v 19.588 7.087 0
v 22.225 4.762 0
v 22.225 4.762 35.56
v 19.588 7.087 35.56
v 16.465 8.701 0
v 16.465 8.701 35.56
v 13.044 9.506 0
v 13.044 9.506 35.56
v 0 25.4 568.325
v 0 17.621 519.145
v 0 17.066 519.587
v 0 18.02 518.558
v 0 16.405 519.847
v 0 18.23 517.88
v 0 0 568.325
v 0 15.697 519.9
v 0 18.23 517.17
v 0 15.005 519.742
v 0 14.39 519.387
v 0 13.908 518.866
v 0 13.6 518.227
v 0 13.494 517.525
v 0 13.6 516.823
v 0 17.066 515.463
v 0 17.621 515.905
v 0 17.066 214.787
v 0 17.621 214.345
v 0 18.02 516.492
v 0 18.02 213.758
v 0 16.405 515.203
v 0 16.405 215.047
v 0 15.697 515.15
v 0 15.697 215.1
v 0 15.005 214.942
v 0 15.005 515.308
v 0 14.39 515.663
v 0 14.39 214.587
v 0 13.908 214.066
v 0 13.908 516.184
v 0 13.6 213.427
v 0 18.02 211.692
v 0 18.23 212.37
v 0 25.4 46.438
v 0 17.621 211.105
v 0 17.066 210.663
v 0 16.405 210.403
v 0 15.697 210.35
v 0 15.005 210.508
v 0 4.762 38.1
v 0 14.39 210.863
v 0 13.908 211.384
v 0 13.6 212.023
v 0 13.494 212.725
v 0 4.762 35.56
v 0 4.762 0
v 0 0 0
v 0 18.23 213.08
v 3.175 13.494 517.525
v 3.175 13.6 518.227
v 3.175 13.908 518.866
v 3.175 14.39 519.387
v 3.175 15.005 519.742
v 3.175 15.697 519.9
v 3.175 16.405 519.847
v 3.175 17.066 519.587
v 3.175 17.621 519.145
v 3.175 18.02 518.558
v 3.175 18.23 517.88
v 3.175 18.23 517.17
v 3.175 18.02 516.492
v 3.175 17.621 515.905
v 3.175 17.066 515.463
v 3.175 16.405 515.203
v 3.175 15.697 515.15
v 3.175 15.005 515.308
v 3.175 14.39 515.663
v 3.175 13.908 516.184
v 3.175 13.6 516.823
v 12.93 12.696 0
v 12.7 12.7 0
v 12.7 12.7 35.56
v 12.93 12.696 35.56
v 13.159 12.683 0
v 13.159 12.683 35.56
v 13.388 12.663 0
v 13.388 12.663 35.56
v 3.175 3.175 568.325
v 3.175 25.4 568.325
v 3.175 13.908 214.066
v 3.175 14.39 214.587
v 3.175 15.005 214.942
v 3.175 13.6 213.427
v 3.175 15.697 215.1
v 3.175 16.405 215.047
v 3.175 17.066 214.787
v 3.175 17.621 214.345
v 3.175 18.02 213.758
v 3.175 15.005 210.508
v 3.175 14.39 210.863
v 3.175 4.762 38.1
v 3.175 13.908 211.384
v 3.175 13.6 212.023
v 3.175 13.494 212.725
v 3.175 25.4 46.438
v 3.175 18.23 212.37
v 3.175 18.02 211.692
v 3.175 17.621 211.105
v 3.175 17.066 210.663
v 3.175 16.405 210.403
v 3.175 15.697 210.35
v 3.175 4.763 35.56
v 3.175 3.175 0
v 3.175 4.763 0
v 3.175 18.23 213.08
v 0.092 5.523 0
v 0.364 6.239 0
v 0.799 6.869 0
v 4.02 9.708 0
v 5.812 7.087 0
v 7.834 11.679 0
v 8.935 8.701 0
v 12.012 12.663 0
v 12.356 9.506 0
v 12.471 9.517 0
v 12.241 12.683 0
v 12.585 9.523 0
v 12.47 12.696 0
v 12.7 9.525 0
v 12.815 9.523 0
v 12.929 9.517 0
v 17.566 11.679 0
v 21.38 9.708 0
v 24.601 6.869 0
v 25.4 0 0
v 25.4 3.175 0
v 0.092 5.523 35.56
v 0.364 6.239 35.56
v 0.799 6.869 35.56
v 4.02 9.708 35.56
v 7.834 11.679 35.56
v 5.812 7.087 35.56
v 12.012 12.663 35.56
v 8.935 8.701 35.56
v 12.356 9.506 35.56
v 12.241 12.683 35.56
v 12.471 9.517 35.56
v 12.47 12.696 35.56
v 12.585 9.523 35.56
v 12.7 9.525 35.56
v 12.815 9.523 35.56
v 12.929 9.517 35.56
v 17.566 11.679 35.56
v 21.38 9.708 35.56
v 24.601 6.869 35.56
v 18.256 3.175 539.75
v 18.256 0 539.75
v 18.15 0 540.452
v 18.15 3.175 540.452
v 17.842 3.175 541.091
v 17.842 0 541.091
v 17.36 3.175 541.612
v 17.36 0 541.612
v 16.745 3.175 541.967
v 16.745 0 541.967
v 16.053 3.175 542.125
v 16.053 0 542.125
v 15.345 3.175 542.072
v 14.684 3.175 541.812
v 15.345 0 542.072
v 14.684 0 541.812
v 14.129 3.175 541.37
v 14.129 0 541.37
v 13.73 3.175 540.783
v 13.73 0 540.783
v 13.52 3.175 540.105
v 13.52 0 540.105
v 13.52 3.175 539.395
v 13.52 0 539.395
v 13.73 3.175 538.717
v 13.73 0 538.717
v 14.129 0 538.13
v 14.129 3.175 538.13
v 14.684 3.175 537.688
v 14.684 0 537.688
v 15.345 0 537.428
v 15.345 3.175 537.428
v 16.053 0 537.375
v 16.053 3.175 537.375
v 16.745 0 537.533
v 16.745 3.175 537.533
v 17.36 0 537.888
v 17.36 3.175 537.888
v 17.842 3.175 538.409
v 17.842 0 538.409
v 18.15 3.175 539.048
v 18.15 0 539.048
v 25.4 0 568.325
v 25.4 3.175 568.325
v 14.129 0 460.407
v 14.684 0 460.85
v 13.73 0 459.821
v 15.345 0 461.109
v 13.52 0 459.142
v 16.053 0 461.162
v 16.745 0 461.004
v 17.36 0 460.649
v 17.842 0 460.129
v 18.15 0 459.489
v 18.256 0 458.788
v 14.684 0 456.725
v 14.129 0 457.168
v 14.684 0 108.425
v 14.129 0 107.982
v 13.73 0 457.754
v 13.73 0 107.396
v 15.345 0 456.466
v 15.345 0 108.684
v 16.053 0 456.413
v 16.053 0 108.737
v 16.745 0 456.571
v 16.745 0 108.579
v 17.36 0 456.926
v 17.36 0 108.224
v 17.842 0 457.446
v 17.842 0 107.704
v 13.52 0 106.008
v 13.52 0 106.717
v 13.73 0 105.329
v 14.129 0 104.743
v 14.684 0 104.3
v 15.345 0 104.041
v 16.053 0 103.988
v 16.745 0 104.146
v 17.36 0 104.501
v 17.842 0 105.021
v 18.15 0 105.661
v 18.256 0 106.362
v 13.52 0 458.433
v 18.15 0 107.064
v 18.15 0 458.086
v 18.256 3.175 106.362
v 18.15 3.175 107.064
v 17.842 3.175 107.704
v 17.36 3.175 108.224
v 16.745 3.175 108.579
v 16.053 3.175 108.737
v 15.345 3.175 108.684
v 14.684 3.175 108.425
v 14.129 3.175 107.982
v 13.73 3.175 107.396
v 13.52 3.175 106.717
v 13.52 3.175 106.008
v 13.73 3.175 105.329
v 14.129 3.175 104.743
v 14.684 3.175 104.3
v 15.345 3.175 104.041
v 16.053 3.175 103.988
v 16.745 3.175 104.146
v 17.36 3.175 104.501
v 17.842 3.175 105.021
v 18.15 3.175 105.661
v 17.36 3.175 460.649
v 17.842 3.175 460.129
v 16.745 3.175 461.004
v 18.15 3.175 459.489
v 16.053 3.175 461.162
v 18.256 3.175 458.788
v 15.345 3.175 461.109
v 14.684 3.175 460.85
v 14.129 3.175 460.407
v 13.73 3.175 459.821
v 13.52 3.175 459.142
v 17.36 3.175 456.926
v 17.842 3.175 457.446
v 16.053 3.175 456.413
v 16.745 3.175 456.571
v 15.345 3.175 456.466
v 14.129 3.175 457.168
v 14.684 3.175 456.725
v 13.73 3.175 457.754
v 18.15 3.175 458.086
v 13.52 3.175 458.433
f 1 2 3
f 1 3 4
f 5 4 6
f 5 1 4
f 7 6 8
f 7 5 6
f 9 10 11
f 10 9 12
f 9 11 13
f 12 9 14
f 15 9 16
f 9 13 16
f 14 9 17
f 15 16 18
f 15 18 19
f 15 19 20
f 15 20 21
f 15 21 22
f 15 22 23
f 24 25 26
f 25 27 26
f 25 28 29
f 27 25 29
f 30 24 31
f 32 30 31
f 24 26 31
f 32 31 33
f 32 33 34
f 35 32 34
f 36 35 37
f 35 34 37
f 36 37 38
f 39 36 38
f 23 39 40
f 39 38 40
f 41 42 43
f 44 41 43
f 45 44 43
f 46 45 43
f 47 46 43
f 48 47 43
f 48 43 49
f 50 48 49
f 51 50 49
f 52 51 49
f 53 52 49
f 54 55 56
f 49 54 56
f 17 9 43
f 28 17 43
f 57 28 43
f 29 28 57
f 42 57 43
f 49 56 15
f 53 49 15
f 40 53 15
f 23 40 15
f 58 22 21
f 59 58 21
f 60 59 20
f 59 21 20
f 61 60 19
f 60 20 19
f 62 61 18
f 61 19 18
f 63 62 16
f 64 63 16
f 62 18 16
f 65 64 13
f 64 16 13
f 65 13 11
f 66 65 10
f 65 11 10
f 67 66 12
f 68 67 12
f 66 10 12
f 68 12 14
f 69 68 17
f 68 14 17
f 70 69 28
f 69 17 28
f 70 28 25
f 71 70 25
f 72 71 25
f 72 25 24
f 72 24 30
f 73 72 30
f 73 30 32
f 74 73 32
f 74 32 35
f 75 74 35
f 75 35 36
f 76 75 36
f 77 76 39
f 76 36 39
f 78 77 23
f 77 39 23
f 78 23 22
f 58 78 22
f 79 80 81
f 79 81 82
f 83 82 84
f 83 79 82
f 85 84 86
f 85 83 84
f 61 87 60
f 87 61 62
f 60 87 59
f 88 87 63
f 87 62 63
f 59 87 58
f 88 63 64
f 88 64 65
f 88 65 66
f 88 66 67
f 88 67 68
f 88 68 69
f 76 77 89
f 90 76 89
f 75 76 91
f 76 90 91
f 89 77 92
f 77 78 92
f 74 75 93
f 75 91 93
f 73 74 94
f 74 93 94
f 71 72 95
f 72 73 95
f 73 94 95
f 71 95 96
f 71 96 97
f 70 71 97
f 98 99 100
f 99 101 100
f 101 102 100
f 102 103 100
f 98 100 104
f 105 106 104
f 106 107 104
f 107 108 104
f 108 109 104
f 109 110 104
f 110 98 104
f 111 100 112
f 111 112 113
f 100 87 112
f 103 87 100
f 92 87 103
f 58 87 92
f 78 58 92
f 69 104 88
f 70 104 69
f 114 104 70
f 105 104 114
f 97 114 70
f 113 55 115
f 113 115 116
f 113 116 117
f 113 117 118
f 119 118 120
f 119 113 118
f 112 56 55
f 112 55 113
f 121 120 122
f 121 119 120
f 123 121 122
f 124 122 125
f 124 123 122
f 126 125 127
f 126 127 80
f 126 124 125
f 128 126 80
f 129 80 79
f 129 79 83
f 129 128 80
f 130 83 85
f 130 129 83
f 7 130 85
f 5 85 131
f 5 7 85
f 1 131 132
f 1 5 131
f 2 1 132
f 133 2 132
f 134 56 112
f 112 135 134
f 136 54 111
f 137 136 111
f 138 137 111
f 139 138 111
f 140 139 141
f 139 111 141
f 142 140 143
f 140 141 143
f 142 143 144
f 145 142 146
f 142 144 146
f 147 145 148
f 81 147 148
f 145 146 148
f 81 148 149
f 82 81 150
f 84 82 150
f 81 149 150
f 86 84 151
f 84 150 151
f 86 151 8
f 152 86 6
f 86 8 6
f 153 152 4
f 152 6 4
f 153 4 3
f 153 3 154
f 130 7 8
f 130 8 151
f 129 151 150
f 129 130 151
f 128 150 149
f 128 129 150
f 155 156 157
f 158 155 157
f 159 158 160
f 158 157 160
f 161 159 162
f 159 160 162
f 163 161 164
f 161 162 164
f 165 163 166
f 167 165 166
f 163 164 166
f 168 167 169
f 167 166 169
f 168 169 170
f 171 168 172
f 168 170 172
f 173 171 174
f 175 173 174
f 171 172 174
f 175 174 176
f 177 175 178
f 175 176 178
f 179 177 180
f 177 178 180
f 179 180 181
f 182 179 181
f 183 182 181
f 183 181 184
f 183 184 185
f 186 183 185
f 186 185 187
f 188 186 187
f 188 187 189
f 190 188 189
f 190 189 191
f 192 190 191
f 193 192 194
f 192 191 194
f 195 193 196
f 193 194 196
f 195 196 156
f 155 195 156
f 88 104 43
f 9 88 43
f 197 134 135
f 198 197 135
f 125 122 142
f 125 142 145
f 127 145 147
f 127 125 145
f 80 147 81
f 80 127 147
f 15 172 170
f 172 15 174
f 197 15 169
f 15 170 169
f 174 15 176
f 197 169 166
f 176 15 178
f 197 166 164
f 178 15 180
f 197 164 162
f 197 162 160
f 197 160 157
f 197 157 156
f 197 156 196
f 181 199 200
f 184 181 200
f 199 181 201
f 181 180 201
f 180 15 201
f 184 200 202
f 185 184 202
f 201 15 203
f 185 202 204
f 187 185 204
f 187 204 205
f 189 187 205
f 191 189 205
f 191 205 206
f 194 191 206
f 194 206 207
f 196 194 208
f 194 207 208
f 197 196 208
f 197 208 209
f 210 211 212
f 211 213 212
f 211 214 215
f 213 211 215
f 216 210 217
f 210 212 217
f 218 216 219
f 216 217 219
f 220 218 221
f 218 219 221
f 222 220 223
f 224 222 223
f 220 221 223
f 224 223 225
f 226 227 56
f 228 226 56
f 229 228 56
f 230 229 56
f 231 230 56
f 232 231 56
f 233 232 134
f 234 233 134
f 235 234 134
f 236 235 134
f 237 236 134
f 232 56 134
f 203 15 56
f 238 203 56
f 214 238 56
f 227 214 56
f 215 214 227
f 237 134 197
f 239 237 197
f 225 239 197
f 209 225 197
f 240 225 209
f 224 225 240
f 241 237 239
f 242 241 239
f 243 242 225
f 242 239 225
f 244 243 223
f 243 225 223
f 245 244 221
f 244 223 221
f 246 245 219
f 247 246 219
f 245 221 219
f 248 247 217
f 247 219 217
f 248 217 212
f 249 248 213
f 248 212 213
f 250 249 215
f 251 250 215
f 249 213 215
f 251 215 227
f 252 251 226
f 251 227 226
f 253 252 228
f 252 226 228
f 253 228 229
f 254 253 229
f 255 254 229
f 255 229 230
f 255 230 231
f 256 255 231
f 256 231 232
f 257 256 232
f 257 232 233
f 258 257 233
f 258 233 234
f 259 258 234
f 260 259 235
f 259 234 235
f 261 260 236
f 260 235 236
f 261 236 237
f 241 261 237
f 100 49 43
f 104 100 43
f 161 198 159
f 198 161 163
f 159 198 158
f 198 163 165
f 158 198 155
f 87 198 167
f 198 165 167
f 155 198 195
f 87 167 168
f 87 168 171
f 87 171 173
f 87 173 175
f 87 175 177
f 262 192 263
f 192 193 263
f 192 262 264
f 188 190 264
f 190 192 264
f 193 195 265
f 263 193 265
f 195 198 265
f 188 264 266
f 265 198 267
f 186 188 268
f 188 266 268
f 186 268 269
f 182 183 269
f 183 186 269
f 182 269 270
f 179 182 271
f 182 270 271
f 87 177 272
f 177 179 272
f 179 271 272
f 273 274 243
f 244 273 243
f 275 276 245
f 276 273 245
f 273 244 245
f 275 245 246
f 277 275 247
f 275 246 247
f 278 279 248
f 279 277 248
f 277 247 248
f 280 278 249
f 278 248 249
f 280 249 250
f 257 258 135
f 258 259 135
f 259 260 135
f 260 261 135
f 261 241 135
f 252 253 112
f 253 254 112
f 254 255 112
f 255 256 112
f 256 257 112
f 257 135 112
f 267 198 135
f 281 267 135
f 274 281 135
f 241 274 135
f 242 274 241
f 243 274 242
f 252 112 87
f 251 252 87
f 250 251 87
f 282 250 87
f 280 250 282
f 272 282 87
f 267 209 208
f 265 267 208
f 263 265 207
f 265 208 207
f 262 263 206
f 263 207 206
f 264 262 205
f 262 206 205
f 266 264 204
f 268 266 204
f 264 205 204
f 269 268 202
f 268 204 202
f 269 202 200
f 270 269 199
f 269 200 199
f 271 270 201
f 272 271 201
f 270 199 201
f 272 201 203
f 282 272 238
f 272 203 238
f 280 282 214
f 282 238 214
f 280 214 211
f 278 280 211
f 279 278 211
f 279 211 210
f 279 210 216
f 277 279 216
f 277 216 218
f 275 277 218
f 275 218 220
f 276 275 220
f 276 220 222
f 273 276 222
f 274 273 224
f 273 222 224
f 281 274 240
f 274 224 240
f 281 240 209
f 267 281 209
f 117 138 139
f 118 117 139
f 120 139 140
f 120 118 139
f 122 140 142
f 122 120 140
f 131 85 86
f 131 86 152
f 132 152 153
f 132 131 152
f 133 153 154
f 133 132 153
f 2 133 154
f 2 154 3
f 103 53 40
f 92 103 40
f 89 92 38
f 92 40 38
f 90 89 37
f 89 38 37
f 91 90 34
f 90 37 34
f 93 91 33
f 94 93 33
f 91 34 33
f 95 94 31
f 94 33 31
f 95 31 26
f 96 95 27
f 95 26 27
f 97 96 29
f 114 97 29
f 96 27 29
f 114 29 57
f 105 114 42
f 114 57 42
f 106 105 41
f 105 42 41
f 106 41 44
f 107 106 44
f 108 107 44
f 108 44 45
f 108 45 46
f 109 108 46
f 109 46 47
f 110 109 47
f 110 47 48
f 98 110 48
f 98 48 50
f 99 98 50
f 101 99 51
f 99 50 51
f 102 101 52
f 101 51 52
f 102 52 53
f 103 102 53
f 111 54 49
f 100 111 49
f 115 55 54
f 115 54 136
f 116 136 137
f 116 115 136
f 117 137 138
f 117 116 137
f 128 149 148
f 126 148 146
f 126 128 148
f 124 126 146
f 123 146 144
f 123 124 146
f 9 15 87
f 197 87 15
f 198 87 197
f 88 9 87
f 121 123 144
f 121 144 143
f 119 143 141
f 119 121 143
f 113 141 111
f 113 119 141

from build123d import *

# Parameters (mm, degrees)
F1_DEPTH = 568.325
F2_R     = 2.38125
F3_DEPTH = 3.175
F4_R     = 2.38125
F5_DEPTH = 3.175
F7_DEPTH = 3.175
F9_DEPTH = 35.56


with BuildPart() as f1:
    # F0 (on Top) → F1 (new body)
    with BuildSketch(Plane.XY):
        Polygon((0, 25.4), (0, 0), (25.4, 0), (25.4, 3.175), (3.175, 3.175), (3.175, 25.4), align=None)
    extrude(amount=F1_DEPTH)

    # F2 (on face) → F3 (cut)
    with BuildSketch(Plane(origin=(0, 0, 0), x_dir=(0, -1, 0), z_dir=(-1, 0, 0))):
        with Locations((-15.875, 517.525)):
            Circle(F2_R)
        with Locations((-15.875, 212.725)):
            Circle(F2_R)
    extrude(amount=-F3_DEPTH, mode=Mode.SUBTRACT)

    # F4 (on face) → F5 (cut)
    with BuildSketch(Plane.XZ):
        with Locations((15.875, 458.7875)):
            Circle(F4_R)
        with Locations((15.875, 106.3625)):
            Circle(F4_R)
        with Locations((15.875, 539.75)):
            Circle(F4_R)
    extrude(amount=-F5_DEPTH, mode=Mode.SUBTRACT)

    # F6 (on face) → F7 (cut)
    with BuildSketch(Plane(origin=(0, 0, 0), x_dir=(0, -1, 0), z_dir=(-1, 0, 0))):
        Polygon((-25.4, 0), (-4.7625, 0), (-4.7625, 38.1), (-25.4, 46.4380912357), align=None)
    extrude(amount=-F7_DEPTH, mode=Mode.SUBTRACT)

    # F8 (on face) → F9 (join)
    with BuildSketch(Plane(origin=(0, 0, 0), x_dir=(1, 0, 0), z_dir=(0, 0, -1))):
        with BuildLine():
            ThreePointArc((13.0437542426, -9.5063361704), (12.8721302689, -9.520330609), (12.7, -9.525))
            Line((12.7, -9.525), (12.7, -12.7))
            ThreePointArc((12.7, -12.7), (13.0442605378, -12.6906612181), (13.3875084853, -12.6626723408))
            ThreePointArc((13.3875084853, -12.6626723408), (19.5337619369, -10.8104975605), (24.6005143968, -6.8690508185))
            Line((24.6005143968, -6.8690508185), (22.225, -4.7625))
            ThreePointArc((22.225, -4.7625), (18.0763265852, -7.9897694283), (13.0437542426, -9.5063361704))
        make_face()
        with BuildLine():
            ThreePointArc((12.7, -9.525), (12.5278697311, -9.520330609), (12.3562457574, -9.5063361704))
            ThreePointArc((12.3562457574, -9.5063361704), (7.3236734148, -7.9897694283), (3.175, -4.7625))
            Line((3.175, -4.7625), (0, -4.7625))
            ThreePointArc((0, -4.7625), (0.2065927495, -5.8890803989), (0.7994856032, -6.8690508185))
            ThreePointArc((0.7994856032, -6.8690508185), (5.8662380631, -10.8104975605), (12.0124915147, -12.6626723408))
            ThreePointArc((12.0124915147, -12.6626723408), (12.3557394622, -12.6906612181), (12.7, -12.7))
            Line((12.7, -12.7), (12.7, -9.525))
        make_face()
    extrude(amount=-F9_DEPTH)


solid = f1.part
